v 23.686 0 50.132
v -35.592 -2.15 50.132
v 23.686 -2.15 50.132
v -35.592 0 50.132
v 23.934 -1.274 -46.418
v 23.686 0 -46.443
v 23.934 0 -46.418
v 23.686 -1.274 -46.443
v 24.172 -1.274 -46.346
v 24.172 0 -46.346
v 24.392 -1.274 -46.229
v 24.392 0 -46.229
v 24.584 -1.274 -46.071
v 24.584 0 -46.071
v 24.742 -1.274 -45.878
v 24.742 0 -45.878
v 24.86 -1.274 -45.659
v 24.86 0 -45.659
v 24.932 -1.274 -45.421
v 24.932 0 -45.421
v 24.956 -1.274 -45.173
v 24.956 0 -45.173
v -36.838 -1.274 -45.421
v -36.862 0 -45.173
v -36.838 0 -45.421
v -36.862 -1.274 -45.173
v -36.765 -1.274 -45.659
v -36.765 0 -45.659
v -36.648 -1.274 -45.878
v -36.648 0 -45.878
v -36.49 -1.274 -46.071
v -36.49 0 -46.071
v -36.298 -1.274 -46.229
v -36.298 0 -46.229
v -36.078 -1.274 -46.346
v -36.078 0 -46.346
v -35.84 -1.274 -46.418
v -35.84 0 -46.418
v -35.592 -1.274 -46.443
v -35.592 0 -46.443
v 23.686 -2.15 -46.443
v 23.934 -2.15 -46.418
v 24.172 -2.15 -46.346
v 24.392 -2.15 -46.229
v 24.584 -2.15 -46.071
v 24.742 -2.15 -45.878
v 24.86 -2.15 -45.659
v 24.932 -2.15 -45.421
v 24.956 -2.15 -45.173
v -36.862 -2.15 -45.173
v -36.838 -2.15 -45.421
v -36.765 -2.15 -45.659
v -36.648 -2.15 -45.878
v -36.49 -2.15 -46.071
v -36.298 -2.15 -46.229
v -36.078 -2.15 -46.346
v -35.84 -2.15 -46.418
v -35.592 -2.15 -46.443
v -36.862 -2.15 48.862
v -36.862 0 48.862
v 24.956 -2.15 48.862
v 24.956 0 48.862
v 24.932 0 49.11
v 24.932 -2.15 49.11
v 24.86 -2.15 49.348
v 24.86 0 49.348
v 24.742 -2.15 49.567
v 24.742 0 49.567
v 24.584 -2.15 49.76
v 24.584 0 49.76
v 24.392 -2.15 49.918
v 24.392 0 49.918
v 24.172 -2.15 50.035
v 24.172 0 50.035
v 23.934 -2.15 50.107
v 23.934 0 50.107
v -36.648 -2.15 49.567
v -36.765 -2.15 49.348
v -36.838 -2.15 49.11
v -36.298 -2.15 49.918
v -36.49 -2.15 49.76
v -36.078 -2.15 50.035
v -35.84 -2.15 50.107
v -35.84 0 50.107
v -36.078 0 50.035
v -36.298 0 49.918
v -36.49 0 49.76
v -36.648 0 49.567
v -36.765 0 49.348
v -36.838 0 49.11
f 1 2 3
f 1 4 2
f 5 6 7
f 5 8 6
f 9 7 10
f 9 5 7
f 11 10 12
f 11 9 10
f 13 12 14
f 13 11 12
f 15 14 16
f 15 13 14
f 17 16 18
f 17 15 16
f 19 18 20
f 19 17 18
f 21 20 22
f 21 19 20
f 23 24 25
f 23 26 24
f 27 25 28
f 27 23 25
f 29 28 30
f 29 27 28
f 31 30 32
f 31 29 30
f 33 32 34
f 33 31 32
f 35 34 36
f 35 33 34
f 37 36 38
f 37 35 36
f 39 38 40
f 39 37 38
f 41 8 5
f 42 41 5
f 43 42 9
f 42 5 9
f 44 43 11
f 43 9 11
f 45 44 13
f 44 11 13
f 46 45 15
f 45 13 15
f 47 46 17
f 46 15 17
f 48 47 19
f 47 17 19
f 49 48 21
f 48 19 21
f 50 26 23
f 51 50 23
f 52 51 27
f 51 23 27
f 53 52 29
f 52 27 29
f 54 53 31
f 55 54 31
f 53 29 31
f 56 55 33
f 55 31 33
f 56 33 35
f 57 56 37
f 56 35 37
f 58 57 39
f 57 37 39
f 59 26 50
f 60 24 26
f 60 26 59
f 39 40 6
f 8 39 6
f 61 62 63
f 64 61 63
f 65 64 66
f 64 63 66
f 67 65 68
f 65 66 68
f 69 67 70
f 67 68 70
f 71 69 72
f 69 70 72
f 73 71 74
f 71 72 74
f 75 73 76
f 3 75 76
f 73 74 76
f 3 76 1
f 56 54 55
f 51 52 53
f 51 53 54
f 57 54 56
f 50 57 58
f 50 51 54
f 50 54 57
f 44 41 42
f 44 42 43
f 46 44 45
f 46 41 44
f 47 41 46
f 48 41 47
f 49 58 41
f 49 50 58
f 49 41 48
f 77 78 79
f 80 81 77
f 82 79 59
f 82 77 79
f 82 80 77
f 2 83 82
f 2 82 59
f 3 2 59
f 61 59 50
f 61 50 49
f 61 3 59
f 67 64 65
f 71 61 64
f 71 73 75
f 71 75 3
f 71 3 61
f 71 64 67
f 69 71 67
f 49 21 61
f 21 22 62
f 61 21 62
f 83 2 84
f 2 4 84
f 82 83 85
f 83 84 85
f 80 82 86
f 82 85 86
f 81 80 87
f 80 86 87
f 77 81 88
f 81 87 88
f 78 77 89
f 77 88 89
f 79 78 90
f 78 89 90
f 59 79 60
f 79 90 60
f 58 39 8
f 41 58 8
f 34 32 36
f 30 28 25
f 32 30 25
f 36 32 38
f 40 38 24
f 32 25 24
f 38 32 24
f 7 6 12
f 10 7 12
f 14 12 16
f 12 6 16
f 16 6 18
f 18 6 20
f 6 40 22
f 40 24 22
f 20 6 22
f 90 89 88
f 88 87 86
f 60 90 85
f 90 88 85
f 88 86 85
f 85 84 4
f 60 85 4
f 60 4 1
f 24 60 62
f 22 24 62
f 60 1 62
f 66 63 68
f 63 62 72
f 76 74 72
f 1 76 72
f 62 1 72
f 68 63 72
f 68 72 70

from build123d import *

# Parameters (mm, degrees)
F0_W     = 61.8183612823
F0_H     = 96.574626863
F1_DEPTH = 1.2738564983
F2_R     = 1.27
F3_R     = 1.27
F4_R     = 1.27
F5_R     = 1.27
F6_DEPTH = 0.876404345


with BuildPart() as f1:
    # F0 (on Front) → F1 (new body)
    with BuildSketch(Plane.XZ):
        with Locations((-5.9528946877, 1.8445216119)):
            Rectangle(F0_W, F0_H)
    extrude(amount=F1_DEPTH)

    # F2
    f2_edges = [f1.edges().sort_by_distance(p)[0] for p in [
        (-36.862075, -0.636928, -46.442792),
    ]]
    fillet(f2_edges, radius=F2_R)

    # F3
    f3_edges = [f1.edges().sort_by_distance(p)[0] for p in [
        (24.956286, -0.636928, -46.442792),
    ]]
    fillet(f3_edges, radius=F3_R)

    # F4
    f4_edges = [f1.edges().sort_by_distance(p)[0] for p in [
        (24.956286, -0.636928, 50.131835),
    ]]
    fillet(f4_edges, radius=F4_R)

    # F5
    f5_edges = [f1.edges().sort_by_distance(p)[0] for p in [
        (-36.862075, -0.636928, 50.131835),
    ]]
    fillet(f5_edges, radius=F5_R)

    # F6 (add): a face of the model
    f6_faces = [f1.faces().sort_by_distance(p)[0] for p in [
        (-5.9528946877, -1.2738564983, 1.8445216119),
    ]]
    extrude(f6_faces, amount=F6_DEPTH)


solid = f1.part
